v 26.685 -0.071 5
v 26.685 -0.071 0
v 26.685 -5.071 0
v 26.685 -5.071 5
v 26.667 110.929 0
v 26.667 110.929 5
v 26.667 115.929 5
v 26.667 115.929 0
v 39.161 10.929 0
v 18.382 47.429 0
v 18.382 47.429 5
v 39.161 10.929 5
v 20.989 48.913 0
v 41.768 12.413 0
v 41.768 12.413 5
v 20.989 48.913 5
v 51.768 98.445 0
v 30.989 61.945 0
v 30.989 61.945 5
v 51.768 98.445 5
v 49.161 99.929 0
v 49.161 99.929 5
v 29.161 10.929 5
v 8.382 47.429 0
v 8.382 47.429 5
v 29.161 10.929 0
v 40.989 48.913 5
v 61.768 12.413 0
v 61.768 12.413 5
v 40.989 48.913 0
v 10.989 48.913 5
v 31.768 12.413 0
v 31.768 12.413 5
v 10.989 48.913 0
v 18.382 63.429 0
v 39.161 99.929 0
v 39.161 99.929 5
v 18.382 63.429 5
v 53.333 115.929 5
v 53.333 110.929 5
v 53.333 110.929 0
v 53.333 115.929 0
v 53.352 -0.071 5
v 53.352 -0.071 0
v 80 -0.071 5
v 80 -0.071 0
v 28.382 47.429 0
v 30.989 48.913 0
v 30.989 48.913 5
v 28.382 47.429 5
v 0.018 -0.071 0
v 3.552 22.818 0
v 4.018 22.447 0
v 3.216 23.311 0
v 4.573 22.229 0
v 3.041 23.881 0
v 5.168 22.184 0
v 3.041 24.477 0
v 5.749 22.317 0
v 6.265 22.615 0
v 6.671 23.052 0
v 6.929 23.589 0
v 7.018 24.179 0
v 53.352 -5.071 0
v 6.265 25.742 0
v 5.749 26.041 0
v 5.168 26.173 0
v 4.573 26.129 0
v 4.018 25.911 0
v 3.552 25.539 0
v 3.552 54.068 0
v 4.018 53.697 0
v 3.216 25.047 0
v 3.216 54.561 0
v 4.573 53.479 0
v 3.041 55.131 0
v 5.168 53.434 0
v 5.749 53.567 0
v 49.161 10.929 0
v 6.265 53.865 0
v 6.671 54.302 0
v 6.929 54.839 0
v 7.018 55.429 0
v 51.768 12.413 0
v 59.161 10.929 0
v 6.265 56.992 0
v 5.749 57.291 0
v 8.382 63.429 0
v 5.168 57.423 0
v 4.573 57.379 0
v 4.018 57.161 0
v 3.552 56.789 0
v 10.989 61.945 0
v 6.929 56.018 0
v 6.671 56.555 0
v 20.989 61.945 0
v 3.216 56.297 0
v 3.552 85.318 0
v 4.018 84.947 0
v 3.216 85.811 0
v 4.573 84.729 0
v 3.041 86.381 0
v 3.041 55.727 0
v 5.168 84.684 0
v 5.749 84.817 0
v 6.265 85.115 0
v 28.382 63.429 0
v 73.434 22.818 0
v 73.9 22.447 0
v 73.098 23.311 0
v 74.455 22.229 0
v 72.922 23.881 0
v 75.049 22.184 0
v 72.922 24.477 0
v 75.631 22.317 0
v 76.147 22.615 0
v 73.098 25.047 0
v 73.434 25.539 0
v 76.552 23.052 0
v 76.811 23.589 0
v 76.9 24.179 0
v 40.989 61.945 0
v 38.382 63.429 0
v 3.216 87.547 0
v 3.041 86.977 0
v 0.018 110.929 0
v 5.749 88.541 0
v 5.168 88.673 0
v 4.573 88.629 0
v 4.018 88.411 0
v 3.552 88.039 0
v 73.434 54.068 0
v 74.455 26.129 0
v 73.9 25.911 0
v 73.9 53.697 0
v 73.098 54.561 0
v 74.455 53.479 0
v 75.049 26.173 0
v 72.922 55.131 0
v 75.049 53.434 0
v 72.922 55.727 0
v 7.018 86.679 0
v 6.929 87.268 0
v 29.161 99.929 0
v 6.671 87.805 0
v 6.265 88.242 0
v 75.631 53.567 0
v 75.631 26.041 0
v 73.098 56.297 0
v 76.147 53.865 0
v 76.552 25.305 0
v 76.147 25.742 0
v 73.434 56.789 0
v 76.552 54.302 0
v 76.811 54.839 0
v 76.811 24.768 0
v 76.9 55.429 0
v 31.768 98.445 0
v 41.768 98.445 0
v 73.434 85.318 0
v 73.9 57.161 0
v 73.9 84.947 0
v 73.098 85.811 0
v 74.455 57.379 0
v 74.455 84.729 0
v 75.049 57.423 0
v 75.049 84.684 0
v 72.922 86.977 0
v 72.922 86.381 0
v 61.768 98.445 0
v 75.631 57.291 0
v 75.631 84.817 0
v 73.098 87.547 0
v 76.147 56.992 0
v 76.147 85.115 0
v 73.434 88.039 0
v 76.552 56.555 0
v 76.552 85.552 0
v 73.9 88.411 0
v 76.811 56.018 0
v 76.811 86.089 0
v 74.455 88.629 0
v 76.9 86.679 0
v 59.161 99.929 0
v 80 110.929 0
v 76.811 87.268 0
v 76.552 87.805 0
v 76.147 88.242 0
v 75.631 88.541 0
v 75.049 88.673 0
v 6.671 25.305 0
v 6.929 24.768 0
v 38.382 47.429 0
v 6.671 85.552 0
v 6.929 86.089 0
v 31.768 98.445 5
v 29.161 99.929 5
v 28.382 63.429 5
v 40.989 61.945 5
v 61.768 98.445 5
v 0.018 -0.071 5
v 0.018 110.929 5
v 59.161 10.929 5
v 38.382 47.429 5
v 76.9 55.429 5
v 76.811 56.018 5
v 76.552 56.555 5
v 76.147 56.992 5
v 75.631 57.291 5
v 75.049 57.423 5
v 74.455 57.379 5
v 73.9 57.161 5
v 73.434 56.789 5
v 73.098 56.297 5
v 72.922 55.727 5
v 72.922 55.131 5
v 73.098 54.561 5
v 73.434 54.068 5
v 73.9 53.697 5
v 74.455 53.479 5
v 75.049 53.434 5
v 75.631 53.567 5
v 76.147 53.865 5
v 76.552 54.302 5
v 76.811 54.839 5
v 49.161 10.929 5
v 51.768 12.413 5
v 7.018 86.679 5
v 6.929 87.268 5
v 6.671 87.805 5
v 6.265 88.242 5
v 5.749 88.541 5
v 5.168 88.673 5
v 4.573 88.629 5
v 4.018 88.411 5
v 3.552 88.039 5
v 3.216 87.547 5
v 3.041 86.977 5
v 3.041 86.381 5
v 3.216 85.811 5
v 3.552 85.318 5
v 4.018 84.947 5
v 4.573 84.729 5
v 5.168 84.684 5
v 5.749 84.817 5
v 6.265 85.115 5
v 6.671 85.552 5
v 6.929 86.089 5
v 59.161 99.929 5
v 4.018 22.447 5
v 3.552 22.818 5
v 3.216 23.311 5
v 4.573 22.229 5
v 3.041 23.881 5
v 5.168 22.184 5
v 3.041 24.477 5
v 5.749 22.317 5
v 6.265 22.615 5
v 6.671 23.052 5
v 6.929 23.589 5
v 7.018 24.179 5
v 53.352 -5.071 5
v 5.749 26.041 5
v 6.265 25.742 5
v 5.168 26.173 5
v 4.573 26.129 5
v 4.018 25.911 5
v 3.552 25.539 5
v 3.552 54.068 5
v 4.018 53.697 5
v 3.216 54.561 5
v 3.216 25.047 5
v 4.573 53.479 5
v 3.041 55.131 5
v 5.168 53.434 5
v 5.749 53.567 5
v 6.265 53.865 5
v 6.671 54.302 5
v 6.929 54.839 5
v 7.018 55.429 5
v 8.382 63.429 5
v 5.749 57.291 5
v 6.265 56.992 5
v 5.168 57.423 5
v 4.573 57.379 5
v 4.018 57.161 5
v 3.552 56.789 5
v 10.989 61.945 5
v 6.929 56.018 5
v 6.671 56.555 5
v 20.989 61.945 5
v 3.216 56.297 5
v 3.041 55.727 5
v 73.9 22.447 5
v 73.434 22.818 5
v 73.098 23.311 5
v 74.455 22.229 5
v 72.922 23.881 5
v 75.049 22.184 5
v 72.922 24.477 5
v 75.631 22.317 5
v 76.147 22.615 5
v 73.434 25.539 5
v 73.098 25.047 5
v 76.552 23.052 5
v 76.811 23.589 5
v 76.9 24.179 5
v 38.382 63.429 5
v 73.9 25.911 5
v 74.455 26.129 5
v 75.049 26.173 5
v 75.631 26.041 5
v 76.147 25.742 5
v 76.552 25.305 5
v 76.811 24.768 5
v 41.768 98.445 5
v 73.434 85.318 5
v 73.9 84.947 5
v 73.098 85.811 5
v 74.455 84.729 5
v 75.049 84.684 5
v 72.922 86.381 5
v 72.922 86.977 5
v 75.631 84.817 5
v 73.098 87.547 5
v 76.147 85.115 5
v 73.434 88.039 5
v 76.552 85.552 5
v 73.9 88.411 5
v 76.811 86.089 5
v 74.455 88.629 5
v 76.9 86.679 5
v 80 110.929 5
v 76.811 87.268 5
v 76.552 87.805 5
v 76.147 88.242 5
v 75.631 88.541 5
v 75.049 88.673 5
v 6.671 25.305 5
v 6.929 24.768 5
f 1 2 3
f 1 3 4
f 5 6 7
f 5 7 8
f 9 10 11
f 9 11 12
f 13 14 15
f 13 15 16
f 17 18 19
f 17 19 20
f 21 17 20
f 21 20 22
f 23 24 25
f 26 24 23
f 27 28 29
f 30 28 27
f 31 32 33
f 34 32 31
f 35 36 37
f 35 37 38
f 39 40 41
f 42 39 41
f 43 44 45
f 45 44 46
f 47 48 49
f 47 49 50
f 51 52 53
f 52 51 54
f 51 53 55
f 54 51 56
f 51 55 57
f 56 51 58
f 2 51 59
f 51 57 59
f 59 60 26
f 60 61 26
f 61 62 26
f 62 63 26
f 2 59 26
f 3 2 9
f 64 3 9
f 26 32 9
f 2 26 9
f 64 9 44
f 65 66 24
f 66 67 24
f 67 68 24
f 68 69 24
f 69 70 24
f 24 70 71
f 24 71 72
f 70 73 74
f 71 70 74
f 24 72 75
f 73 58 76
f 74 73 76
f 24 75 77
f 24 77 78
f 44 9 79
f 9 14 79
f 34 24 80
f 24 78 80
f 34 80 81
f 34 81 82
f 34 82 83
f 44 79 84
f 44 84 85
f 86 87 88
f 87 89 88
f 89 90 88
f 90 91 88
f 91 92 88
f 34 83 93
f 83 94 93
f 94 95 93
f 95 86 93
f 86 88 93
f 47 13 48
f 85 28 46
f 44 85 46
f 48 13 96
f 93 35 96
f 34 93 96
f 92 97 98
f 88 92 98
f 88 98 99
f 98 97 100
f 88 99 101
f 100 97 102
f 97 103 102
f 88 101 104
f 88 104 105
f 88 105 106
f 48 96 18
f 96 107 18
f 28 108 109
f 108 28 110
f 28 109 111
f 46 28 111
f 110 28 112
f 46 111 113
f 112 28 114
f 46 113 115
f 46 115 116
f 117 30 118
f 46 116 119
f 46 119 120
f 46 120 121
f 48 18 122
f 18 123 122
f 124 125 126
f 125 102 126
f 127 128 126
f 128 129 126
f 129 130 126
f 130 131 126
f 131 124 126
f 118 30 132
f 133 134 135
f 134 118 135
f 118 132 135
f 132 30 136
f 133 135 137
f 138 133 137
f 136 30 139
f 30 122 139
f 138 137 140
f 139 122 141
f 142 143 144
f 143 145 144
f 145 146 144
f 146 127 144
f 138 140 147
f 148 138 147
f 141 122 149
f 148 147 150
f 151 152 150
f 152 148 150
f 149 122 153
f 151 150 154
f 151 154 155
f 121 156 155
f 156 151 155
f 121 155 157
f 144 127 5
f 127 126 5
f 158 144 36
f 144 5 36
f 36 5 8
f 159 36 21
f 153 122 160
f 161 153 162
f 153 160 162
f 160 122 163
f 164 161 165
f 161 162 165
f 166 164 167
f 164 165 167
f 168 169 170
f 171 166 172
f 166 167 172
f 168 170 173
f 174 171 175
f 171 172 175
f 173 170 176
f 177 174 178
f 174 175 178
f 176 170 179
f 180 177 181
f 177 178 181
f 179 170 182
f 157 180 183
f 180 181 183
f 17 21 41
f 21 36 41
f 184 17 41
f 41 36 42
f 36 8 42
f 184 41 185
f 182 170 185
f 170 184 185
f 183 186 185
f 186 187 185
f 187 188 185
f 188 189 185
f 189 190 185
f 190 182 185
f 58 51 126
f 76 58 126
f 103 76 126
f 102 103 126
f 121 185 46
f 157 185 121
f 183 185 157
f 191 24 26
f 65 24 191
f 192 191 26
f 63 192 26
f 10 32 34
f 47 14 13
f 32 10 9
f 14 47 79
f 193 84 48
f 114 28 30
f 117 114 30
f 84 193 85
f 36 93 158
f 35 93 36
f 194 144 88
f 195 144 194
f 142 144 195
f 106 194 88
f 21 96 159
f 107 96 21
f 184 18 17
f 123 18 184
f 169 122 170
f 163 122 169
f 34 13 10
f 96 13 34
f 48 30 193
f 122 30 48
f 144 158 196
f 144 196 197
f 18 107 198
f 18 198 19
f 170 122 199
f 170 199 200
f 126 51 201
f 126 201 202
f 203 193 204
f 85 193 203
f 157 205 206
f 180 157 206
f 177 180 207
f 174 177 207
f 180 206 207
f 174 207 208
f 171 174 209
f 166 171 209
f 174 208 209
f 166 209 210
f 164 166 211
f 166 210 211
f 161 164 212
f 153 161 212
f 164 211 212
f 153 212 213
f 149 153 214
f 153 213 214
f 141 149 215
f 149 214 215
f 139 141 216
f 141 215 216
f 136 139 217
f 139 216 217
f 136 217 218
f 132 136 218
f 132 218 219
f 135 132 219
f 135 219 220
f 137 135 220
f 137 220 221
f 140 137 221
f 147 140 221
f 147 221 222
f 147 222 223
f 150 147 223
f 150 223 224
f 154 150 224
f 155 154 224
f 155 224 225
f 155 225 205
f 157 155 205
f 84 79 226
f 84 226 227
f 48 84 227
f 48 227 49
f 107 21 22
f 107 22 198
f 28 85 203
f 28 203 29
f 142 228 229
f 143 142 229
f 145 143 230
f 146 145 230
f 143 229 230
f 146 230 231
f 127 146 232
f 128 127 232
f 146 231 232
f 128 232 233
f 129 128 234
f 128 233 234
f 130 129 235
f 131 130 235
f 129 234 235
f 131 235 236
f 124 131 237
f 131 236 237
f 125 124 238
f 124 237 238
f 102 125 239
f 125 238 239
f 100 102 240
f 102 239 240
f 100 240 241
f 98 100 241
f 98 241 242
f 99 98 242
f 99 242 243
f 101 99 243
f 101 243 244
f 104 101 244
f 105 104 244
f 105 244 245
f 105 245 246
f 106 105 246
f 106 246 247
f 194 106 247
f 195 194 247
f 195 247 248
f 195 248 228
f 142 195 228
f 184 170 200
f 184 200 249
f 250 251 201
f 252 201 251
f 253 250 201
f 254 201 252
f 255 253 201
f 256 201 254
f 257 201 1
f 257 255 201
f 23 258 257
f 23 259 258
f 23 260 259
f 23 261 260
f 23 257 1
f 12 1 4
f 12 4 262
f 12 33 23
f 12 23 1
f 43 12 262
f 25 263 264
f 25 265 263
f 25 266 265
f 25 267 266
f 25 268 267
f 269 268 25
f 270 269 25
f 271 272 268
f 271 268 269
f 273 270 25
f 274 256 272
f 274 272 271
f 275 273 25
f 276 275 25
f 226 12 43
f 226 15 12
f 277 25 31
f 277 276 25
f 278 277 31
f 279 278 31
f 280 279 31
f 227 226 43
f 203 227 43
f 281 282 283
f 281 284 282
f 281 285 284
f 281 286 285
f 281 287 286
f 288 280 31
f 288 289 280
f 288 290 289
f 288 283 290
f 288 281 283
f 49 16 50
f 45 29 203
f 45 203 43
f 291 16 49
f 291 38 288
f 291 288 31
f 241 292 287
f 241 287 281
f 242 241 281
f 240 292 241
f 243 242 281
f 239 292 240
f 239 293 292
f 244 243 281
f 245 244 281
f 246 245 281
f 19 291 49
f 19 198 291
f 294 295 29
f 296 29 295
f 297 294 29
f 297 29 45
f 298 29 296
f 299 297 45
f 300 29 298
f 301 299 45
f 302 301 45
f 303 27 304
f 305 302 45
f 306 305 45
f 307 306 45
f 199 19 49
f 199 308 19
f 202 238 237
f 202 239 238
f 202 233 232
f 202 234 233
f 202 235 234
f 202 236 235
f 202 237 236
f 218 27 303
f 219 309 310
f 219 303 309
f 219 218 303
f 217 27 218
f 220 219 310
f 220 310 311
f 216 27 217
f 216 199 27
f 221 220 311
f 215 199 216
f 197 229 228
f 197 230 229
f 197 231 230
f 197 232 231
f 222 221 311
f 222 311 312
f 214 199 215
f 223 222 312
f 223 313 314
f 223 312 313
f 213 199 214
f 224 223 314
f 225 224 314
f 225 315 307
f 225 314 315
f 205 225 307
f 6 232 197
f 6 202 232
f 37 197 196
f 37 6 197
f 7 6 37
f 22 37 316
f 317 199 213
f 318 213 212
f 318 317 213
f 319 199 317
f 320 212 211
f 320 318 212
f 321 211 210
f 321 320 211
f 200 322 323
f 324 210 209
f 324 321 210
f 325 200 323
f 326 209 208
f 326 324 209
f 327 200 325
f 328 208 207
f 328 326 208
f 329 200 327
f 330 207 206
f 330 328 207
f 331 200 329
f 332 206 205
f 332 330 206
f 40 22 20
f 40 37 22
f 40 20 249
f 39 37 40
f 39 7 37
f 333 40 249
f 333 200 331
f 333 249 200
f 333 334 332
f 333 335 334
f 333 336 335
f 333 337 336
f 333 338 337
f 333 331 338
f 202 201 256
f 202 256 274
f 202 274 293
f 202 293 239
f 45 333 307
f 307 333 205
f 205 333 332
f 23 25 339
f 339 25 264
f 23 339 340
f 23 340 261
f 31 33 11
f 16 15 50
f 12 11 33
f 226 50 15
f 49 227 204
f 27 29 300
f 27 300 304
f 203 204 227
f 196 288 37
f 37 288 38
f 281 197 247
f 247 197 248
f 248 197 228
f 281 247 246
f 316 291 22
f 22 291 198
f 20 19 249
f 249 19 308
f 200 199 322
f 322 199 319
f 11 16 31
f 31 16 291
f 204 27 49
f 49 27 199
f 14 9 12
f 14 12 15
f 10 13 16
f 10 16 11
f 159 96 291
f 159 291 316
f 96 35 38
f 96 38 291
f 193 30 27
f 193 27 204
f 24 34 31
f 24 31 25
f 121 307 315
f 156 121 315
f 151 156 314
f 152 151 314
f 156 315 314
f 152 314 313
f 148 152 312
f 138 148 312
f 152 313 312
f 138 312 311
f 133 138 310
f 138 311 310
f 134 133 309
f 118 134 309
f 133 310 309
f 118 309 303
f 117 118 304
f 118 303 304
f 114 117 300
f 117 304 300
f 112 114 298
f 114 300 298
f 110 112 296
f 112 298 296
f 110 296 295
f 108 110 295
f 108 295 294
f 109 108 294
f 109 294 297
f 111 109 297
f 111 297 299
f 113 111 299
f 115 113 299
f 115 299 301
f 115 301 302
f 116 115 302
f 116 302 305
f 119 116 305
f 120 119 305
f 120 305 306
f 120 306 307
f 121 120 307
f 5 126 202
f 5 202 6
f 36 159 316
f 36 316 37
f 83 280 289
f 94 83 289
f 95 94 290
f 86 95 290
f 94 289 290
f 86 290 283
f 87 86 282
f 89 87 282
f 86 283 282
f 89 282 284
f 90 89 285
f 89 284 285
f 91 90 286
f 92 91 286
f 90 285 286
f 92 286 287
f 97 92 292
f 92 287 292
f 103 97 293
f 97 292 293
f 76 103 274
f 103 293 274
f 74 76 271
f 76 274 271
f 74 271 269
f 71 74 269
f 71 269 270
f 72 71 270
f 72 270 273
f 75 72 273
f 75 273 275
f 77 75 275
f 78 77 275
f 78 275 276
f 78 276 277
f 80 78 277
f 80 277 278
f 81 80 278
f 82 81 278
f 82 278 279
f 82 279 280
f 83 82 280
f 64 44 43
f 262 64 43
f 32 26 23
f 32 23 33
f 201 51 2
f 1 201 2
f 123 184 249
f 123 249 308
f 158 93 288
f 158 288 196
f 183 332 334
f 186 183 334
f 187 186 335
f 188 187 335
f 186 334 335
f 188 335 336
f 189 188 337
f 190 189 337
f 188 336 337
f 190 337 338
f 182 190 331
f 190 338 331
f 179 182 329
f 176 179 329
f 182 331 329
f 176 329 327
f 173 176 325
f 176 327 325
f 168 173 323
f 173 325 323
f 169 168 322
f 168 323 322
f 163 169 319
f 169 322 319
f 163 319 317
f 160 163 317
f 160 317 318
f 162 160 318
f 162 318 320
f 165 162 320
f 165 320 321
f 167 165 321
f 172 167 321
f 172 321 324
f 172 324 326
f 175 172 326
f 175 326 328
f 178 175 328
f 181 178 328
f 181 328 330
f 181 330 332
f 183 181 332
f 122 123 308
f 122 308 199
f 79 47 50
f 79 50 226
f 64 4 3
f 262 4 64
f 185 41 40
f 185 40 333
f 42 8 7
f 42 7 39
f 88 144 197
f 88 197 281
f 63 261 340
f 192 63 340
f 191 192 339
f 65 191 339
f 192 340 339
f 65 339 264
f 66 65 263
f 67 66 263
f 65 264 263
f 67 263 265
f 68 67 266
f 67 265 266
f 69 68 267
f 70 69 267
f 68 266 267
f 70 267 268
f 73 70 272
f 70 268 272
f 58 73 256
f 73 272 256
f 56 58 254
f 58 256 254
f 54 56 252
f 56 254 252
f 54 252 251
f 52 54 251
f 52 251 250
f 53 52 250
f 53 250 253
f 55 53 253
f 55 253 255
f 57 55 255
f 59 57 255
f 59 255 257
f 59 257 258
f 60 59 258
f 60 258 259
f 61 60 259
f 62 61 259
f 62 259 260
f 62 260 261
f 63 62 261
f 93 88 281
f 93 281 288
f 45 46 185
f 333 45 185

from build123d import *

# Parameters (mm, degrees)
CROQUIS1_W              = 79.981686337
CROQUIS1_H              = 111
SALIENTE_EXTRUIR1_DEPTH = 5
CROQUIS2_W              = 26.666666667
CROQUIS2_H              = 5
SALIENTE_EXTRUIR2_DEPTH = 5
CROQUIS3_W              = 26.666666666
CROQUIS3_H              = 5
SALIENTE_EXTRUIR3_DEPTH = 5
CROQUIS4_R              = 2
CORTAR_EXTRUIR1_DEPTH   = 10


with BuildPart() as part:
    # Croquis1 → Saliente-Extruir1 (new body)
    with BuildSketch(Plane.XY):
        with Locations((40.009156832, 55.428810295)):
            Rectangle(CROQUIS1_W, CROQUIS1_H)
        Polygon((40.989314194, 48.912995634), (38.382171337, 47.428810295), (59.160766092, 10.928810295), (61.767908949, 12.412995634), align=None, mode=Mode.SUBTRACT)
        Polygon((49.160766092, 10.928810295), (51.767908949, 12.412995634), (30.989314194, 48.912995634), (28.382171337, 47.428810295), align=None, mode=Mode.SUBTRACT)
        Polygon((20.989314194, 48.912995634), (18.382171337, 47.428810295), (39.160766092, 10.928810295), (41.767908949, 12.412995634), align=None, mode=Mode.SUBTRACT)
        Polygon((29.160766092, 10.928810295), (31.767908949, 12.412995634), (10.989314194, 48.912995634), (8.382171337, 47.428810295), align=None, mode=Mode.SUBTRACT)
        Polygon((38.382171337, 63.428810295), (40.989314194, 61.944624955), (61.767908949, 98.444624955), (59.160766092, 99.928810295), align=None, mode=Mode.SUBTRACT)
        Polygon((51.767908949, 98.444624955), (49.160766092, 99.928810295), (28.382171337, 63.428810295), (30.989314194, 61.944624955), align=None, mode=Mode.SUBTRACT)
        Polygon((18.382171337, 63.428810295), (20.989314194, 61.944624955), (41.767908949, 98.444624955), (39.160766092, 99.928810295), align=None, mode=Mode.SUBTRACT)
        Polygon((31.767908949, 98.444624955), (29.160766092, 99.928810295), (8.382171337, 63.428810295), (10.989314194, 61.944624955), align=None, mode=Mode.SUBTRACT)
    extrude(amount=SALIENTE_EXTRUIR1_DEPTH)

    # Croquis2 → Saliente-Extruir2 (add)
    with BuildSketch(Plane.XZ.offset(0.071189705)):
        with Locations((40.018313663, 2.5)):
            Rectangle(CROQUIS2_W, CROQUIS2_H)
    extrude(amount=SALIENTE_EXTRUIR2_DEPTH)

    # Croquis3 → Saliente-Extruir3 (add)
    with BuildSketch(Plane(origin=(0, 110.928810295, 0), x_dir=(1, 0, 0), z_dir=(0, 1, 0))):
        with Locations((40, -2.5)):
            Rectangle(CROQUIS3_W, CROQUIS3_H)
    extrude(amount=SALIENTE_EXTRUIR3_DEPTH)

    # Croquis4 → Cortar-Extruir1 (cut)
    with BuildSketch(Plane.XY.offset(5)):
        with Locations((74.9, 55.428810295)):
            Circle(CROQUIS4_R)
        with Locations((74.9, 86.678810295)):
            Circle(CROQUIS4_R)
        with Locations((74.9, 24.178810295)):
            Circle(CROQUIS4_R)
        with Locations((5.018313663, 55.428810295)):
            Circle(CROQUIS4_R)
        with Locations((5.018313663, 86.678810295)):
            Circle(CROQUIS4_R)
        with Locations((5.018313663, 24.178810295)):
            Circle(CROQUIS4_R)
    extrude(amount=-CORTAR_EXTRUIR1_DEPTH, mode=Mode.SUBTRACT)


solid = part.part
